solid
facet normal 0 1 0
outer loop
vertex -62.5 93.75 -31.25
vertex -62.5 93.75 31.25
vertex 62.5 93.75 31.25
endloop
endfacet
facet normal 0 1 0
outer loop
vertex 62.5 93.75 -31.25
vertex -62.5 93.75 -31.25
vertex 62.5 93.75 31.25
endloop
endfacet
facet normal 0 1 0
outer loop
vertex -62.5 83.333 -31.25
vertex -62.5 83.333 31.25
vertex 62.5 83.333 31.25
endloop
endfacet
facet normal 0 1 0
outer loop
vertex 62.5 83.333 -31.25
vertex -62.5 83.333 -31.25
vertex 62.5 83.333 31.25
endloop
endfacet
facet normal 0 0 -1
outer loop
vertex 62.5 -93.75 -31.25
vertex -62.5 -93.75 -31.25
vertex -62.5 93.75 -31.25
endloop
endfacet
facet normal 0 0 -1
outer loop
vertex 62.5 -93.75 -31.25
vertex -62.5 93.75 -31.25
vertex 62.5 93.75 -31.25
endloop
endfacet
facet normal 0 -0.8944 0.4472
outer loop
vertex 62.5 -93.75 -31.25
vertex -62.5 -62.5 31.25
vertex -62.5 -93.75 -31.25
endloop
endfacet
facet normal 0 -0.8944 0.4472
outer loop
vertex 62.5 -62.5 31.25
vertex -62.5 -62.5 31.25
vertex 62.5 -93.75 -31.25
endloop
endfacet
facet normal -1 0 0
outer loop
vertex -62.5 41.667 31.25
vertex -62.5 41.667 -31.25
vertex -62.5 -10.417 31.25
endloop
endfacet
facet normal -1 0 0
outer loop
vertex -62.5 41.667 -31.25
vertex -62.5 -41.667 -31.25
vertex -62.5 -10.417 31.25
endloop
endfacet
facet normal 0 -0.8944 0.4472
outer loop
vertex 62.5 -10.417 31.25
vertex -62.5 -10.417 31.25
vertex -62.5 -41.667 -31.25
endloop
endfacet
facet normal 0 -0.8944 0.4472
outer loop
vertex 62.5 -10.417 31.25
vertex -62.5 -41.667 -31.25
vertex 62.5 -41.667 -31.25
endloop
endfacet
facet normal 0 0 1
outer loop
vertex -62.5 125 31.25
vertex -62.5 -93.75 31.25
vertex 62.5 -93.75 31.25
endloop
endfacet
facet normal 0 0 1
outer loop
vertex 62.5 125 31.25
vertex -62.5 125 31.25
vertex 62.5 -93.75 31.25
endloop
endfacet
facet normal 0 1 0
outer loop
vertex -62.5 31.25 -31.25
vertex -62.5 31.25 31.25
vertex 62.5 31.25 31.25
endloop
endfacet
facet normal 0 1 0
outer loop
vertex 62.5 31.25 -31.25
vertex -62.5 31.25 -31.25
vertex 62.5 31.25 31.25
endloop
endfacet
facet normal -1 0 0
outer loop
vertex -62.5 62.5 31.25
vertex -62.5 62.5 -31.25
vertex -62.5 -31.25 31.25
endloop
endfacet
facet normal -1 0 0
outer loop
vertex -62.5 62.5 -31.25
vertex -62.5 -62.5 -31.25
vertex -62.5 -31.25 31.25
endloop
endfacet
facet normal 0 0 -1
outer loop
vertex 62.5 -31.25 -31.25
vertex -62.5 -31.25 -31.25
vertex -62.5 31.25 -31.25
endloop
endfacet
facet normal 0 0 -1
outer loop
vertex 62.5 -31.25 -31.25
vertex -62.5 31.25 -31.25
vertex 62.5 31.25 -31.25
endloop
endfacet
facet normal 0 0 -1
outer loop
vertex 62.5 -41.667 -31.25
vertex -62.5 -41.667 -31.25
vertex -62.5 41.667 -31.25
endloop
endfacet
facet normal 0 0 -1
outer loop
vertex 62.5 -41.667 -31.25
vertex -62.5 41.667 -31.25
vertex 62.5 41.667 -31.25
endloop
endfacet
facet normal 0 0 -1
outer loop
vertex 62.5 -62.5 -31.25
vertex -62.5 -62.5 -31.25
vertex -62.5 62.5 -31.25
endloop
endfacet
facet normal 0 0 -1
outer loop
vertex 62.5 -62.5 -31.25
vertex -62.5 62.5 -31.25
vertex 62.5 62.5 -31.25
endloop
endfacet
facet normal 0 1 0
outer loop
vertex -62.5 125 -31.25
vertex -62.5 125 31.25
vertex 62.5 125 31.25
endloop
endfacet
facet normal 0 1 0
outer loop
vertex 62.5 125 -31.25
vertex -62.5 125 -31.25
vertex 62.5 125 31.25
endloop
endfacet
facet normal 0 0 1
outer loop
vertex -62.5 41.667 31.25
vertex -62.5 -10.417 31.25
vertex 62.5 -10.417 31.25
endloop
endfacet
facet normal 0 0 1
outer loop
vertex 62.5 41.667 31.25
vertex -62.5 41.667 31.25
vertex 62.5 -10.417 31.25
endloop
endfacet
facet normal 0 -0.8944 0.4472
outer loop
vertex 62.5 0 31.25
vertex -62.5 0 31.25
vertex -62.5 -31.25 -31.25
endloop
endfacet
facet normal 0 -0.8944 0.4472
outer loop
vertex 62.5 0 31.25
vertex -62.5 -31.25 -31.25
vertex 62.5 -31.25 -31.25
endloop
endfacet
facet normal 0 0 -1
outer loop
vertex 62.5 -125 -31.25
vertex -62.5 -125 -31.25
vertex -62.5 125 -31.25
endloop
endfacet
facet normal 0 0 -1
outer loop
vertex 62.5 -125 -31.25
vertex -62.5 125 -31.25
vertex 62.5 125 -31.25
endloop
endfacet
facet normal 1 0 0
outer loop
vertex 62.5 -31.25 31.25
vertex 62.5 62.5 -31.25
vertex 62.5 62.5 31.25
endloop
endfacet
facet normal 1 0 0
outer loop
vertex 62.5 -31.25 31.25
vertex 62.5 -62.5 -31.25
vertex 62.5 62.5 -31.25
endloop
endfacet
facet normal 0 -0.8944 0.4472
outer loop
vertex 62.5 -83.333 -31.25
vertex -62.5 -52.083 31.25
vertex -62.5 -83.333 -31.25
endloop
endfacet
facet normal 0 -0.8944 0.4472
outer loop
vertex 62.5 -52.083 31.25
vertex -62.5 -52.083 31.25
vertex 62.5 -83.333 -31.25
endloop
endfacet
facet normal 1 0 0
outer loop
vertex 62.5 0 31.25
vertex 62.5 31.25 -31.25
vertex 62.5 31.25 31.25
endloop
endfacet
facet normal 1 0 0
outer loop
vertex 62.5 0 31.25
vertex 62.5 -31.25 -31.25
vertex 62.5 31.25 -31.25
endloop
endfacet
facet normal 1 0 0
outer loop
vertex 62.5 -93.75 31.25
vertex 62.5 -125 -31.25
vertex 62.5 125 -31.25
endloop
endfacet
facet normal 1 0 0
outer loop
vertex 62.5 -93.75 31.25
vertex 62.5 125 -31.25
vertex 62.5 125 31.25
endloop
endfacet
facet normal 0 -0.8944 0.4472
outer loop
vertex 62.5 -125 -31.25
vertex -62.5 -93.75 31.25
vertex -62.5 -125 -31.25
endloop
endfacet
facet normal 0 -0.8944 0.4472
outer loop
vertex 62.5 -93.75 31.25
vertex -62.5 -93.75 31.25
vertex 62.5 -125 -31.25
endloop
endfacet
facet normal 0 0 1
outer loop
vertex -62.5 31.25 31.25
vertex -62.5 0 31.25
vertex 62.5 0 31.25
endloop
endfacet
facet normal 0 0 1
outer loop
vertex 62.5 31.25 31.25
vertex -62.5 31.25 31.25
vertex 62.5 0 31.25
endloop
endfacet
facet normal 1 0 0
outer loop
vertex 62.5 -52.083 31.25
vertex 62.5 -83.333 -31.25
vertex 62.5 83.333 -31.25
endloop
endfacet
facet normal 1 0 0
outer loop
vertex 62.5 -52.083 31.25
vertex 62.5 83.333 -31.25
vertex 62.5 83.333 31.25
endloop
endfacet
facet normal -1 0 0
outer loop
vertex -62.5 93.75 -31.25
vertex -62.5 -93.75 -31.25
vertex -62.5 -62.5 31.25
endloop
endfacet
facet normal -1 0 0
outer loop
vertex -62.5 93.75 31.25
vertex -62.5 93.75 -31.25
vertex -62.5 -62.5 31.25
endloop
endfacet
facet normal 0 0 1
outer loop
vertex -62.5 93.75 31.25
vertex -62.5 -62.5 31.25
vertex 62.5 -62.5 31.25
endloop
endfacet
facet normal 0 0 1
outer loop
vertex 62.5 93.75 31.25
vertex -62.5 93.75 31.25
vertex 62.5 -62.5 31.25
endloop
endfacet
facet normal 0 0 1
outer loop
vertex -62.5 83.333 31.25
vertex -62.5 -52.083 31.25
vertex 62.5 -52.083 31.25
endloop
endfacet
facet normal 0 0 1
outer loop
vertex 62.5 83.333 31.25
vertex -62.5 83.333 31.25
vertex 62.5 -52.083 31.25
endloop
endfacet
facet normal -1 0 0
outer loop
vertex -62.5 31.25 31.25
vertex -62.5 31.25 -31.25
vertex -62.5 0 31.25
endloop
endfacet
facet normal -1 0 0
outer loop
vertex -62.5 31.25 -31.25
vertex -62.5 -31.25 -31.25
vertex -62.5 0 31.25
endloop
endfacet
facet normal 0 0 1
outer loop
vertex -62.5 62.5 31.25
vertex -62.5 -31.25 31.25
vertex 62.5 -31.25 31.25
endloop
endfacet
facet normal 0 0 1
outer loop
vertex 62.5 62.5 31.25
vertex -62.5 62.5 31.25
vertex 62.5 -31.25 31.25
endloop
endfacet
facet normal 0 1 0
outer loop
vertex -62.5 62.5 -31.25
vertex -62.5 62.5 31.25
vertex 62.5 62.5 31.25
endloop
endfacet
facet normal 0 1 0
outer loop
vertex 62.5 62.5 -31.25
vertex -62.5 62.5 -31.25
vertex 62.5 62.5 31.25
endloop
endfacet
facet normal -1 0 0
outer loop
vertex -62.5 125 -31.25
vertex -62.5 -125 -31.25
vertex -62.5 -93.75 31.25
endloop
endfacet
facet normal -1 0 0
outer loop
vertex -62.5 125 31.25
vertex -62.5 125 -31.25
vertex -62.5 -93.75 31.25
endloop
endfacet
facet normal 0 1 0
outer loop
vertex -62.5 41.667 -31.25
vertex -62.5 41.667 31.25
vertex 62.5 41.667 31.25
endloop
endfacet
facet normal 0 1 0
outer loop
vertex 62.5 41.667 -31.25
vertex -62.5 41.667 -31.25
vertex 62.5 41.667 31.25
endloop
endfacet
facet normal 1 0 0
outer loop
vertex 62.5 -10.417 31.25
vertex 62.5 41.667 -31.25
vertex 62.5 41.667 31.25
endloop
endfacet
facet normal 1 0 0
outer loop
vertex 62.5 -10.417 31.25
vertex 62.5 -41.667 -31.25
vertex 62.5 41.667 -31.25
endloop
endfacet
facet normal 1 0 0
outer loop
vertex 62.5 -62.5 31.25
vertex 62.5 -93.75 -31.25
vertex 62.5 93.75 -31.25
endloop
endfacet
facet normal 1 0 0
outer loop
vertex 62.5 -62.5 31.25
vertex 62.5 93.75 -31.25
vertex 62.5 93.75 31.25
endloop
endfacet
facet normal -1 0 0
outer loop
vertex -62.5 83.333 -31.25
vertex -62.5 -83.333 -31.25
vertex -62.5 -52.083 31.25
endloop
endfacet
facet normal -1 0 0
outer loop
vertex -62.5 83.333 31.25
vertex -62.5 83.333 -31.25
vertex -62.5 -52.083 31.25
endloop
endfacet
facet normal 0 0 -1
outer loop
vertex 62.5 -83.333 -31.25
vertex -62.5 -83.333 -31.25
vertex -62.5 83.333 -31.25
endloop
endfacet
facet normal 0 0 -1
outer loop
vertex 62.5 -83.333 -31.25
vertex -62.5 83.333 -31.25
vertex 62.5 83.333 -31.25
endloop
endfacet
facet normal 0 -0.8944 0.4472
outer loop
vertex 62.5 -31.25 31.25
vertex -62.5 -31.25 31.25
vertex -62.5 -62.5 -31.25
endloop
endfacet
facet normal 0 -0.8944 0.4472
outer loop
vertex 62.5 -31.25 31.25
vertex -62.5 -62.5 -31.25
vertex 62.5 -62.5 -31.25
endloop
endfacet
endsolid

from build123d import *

# Parameters (mm, degrees)
F0_W      = 125
F0_H      = 62.5
F1_DEPTH  = 125
F2_DEPTH  = 62.5
F3_DEPTH  = 93.75
F4_DEPTH  = 31.25
F5_DEPTH  = 83.3333333333
F6_DEPTH  = 41.6666666667
F7_SIZE2  = 31.24999
F7_SIZE   = 62.49999
F8_SIZE2  = 31.24999
F8_SIZE   = 62.49999
F9_SIZE2  = 31.24999
F9_SIZE   = 62.49999
F10_SIZE2 = 31.24999
F10_SIZE  = 62.49999
F11_SIZE2 = 31.24999
F11_SIZE  = 62.49999
F12_SIZE2 = 31.24999
F12_SIZE  = 62.49999


# Not quite as in the source:
# - a fillet or chamfer is up to 0.001 mm smaller than in the source, because OpenCascade refuses the exact size


with BuildPart() as f1:
    # F0 (on Front) → F1 (new body, symmetric)
    with BuildSketch(Plane.XZ):
        Rectangle(F0_W, F0_H)
    extrude(amount=F1_DEPTH, both=True)

    # F7 (size 62.5 and 31.25 in the source; OpenCascade refuses exactly that, so slightly less here)
    f7_edges = [f1.edges().sort_by_distance(p)[0] for p in [
        (0, -125, 31.25),
    ]]
    f7_side = f1.faces().sort_by_distance((0, -125, 0))[0]
    chamfer(f7_edges, length=F7_SIZE, length2=F7_SIZE2, reference=f7_side)


with BuildPart() as f2:
    # F0 (on Front) → F2 (new body, symmetric)
    with BuildSketch(Plane.XZ):
        Rectangle(F0_W, F0_H)
    extrude(amount=F2_DEPTH, both=True)

    # F8 (size 62.5 and 31.25 in the source; OpenCascade refuses exactly that, so slightly less here)
    f8_edges = [f2.edges().sort_by_distance(p)[0] for p in [
        (0, -62.5, 31.25),
    ]]
    f8_side = f2.faces().sort_by_distance((0, -62.5, 0))[0]
    chamfer(f8_edges, length=F8_SIZE, length2=F8_SIZE2, reference=f8_side)


with BuildPart() as f3:
    # F0 (on Front) → F3 (new body, symmetric)
    with BuildSketch(Plane.XZ):
        Rectangle(F0_W, F0_H)
    extrude(amount=F3_DEPTH, both=True)

    # F9 (size 62.5 and 31.25 in the source; OpenCascade refuses exactly that, so slightly less here)
    f9_edges = [f3.edges().sort_by_distance(p)[0] for p in [
        (0, -93.75, 31.25),
    ]]
    f9_side = f3.faces().sort_by_distance((0, -93.75, 0))[0]
    chamfer(f9_edges, length=F9_SIZE, length2=F9_SIZE2, reference=f9_side)


with BuildPart() as f4:
    # F0 (on Front) → F4 (new body, symmetric)
    with BuildSketch(Plane.XZ):
        Rectangle(F0_W, F0_H)
    extrude(amount=F4_DEPTH, both=True)

    # F11 (size 62.5 and 31.25 in the source; OpenCascade refuses exactly that, so slightly less here)
    f11_edges = [f4.edges().sort_by_distance(p)[0] for p in [
        (0, -31.25, 31.25),
    ]]
    f11_side = f4.faces().sort_by_distance((0, -31.25, 0))[0]
    chamfer(f11_edges, length=F11_SIZE, length2=F11_SIZE2, reference=f11_side)


with BuildPart() as f5:
    # F0 (on Front) → F5 (new body, symmetric)
    with BuildSketch(Plane.XZ):
        Rectangle(F0_W, F0_H)
    extrude(amount=F5_DEPTH, both=True)

    # F10 (size 62.5 and 31.25 in the source; OpenCascade refuses exactly that, so slightly less here)
    f10_edges = [f5.edges().sort_by_distance(p)[0] for p in [
        (0, -83.333333, 31.25),
    ]]
    f10_side = f5.faces().sort_by_distance((0, -83.333333, 0))[0]
    chamfer(f10_edges, length=F10_SIZE, length2=F10_SIZE2, reference=f10_side)


with BuildPart() as f6:
    # F0 (on Front) → F6 (new body, symmetric)
    with BuildSketch(Plane.XZ):
        Rectangle(F0_W, F0_H)
    extrude(amount=F6_DEPTH, both=True)

    # F12 (size 62.5 and 31.25 in the source; OpenCascade refuses exactly that, so slightly less here)
    f12_edges = [f6.edges().sort_by_distance(p)[0] for p in [
        (0, -41.666667, 31.25),
    ]]
    f12_side = f6.faces().sort_by_distance((0, -41.666667, 0))[0]
    chamfer(f12_edges, length=F12_SIZE, length2=F12_SIZE2, reference=f12_side)


solid = Compound([f1.part, f2.part, f3.part, f4.part, f5.part, f6.part])
